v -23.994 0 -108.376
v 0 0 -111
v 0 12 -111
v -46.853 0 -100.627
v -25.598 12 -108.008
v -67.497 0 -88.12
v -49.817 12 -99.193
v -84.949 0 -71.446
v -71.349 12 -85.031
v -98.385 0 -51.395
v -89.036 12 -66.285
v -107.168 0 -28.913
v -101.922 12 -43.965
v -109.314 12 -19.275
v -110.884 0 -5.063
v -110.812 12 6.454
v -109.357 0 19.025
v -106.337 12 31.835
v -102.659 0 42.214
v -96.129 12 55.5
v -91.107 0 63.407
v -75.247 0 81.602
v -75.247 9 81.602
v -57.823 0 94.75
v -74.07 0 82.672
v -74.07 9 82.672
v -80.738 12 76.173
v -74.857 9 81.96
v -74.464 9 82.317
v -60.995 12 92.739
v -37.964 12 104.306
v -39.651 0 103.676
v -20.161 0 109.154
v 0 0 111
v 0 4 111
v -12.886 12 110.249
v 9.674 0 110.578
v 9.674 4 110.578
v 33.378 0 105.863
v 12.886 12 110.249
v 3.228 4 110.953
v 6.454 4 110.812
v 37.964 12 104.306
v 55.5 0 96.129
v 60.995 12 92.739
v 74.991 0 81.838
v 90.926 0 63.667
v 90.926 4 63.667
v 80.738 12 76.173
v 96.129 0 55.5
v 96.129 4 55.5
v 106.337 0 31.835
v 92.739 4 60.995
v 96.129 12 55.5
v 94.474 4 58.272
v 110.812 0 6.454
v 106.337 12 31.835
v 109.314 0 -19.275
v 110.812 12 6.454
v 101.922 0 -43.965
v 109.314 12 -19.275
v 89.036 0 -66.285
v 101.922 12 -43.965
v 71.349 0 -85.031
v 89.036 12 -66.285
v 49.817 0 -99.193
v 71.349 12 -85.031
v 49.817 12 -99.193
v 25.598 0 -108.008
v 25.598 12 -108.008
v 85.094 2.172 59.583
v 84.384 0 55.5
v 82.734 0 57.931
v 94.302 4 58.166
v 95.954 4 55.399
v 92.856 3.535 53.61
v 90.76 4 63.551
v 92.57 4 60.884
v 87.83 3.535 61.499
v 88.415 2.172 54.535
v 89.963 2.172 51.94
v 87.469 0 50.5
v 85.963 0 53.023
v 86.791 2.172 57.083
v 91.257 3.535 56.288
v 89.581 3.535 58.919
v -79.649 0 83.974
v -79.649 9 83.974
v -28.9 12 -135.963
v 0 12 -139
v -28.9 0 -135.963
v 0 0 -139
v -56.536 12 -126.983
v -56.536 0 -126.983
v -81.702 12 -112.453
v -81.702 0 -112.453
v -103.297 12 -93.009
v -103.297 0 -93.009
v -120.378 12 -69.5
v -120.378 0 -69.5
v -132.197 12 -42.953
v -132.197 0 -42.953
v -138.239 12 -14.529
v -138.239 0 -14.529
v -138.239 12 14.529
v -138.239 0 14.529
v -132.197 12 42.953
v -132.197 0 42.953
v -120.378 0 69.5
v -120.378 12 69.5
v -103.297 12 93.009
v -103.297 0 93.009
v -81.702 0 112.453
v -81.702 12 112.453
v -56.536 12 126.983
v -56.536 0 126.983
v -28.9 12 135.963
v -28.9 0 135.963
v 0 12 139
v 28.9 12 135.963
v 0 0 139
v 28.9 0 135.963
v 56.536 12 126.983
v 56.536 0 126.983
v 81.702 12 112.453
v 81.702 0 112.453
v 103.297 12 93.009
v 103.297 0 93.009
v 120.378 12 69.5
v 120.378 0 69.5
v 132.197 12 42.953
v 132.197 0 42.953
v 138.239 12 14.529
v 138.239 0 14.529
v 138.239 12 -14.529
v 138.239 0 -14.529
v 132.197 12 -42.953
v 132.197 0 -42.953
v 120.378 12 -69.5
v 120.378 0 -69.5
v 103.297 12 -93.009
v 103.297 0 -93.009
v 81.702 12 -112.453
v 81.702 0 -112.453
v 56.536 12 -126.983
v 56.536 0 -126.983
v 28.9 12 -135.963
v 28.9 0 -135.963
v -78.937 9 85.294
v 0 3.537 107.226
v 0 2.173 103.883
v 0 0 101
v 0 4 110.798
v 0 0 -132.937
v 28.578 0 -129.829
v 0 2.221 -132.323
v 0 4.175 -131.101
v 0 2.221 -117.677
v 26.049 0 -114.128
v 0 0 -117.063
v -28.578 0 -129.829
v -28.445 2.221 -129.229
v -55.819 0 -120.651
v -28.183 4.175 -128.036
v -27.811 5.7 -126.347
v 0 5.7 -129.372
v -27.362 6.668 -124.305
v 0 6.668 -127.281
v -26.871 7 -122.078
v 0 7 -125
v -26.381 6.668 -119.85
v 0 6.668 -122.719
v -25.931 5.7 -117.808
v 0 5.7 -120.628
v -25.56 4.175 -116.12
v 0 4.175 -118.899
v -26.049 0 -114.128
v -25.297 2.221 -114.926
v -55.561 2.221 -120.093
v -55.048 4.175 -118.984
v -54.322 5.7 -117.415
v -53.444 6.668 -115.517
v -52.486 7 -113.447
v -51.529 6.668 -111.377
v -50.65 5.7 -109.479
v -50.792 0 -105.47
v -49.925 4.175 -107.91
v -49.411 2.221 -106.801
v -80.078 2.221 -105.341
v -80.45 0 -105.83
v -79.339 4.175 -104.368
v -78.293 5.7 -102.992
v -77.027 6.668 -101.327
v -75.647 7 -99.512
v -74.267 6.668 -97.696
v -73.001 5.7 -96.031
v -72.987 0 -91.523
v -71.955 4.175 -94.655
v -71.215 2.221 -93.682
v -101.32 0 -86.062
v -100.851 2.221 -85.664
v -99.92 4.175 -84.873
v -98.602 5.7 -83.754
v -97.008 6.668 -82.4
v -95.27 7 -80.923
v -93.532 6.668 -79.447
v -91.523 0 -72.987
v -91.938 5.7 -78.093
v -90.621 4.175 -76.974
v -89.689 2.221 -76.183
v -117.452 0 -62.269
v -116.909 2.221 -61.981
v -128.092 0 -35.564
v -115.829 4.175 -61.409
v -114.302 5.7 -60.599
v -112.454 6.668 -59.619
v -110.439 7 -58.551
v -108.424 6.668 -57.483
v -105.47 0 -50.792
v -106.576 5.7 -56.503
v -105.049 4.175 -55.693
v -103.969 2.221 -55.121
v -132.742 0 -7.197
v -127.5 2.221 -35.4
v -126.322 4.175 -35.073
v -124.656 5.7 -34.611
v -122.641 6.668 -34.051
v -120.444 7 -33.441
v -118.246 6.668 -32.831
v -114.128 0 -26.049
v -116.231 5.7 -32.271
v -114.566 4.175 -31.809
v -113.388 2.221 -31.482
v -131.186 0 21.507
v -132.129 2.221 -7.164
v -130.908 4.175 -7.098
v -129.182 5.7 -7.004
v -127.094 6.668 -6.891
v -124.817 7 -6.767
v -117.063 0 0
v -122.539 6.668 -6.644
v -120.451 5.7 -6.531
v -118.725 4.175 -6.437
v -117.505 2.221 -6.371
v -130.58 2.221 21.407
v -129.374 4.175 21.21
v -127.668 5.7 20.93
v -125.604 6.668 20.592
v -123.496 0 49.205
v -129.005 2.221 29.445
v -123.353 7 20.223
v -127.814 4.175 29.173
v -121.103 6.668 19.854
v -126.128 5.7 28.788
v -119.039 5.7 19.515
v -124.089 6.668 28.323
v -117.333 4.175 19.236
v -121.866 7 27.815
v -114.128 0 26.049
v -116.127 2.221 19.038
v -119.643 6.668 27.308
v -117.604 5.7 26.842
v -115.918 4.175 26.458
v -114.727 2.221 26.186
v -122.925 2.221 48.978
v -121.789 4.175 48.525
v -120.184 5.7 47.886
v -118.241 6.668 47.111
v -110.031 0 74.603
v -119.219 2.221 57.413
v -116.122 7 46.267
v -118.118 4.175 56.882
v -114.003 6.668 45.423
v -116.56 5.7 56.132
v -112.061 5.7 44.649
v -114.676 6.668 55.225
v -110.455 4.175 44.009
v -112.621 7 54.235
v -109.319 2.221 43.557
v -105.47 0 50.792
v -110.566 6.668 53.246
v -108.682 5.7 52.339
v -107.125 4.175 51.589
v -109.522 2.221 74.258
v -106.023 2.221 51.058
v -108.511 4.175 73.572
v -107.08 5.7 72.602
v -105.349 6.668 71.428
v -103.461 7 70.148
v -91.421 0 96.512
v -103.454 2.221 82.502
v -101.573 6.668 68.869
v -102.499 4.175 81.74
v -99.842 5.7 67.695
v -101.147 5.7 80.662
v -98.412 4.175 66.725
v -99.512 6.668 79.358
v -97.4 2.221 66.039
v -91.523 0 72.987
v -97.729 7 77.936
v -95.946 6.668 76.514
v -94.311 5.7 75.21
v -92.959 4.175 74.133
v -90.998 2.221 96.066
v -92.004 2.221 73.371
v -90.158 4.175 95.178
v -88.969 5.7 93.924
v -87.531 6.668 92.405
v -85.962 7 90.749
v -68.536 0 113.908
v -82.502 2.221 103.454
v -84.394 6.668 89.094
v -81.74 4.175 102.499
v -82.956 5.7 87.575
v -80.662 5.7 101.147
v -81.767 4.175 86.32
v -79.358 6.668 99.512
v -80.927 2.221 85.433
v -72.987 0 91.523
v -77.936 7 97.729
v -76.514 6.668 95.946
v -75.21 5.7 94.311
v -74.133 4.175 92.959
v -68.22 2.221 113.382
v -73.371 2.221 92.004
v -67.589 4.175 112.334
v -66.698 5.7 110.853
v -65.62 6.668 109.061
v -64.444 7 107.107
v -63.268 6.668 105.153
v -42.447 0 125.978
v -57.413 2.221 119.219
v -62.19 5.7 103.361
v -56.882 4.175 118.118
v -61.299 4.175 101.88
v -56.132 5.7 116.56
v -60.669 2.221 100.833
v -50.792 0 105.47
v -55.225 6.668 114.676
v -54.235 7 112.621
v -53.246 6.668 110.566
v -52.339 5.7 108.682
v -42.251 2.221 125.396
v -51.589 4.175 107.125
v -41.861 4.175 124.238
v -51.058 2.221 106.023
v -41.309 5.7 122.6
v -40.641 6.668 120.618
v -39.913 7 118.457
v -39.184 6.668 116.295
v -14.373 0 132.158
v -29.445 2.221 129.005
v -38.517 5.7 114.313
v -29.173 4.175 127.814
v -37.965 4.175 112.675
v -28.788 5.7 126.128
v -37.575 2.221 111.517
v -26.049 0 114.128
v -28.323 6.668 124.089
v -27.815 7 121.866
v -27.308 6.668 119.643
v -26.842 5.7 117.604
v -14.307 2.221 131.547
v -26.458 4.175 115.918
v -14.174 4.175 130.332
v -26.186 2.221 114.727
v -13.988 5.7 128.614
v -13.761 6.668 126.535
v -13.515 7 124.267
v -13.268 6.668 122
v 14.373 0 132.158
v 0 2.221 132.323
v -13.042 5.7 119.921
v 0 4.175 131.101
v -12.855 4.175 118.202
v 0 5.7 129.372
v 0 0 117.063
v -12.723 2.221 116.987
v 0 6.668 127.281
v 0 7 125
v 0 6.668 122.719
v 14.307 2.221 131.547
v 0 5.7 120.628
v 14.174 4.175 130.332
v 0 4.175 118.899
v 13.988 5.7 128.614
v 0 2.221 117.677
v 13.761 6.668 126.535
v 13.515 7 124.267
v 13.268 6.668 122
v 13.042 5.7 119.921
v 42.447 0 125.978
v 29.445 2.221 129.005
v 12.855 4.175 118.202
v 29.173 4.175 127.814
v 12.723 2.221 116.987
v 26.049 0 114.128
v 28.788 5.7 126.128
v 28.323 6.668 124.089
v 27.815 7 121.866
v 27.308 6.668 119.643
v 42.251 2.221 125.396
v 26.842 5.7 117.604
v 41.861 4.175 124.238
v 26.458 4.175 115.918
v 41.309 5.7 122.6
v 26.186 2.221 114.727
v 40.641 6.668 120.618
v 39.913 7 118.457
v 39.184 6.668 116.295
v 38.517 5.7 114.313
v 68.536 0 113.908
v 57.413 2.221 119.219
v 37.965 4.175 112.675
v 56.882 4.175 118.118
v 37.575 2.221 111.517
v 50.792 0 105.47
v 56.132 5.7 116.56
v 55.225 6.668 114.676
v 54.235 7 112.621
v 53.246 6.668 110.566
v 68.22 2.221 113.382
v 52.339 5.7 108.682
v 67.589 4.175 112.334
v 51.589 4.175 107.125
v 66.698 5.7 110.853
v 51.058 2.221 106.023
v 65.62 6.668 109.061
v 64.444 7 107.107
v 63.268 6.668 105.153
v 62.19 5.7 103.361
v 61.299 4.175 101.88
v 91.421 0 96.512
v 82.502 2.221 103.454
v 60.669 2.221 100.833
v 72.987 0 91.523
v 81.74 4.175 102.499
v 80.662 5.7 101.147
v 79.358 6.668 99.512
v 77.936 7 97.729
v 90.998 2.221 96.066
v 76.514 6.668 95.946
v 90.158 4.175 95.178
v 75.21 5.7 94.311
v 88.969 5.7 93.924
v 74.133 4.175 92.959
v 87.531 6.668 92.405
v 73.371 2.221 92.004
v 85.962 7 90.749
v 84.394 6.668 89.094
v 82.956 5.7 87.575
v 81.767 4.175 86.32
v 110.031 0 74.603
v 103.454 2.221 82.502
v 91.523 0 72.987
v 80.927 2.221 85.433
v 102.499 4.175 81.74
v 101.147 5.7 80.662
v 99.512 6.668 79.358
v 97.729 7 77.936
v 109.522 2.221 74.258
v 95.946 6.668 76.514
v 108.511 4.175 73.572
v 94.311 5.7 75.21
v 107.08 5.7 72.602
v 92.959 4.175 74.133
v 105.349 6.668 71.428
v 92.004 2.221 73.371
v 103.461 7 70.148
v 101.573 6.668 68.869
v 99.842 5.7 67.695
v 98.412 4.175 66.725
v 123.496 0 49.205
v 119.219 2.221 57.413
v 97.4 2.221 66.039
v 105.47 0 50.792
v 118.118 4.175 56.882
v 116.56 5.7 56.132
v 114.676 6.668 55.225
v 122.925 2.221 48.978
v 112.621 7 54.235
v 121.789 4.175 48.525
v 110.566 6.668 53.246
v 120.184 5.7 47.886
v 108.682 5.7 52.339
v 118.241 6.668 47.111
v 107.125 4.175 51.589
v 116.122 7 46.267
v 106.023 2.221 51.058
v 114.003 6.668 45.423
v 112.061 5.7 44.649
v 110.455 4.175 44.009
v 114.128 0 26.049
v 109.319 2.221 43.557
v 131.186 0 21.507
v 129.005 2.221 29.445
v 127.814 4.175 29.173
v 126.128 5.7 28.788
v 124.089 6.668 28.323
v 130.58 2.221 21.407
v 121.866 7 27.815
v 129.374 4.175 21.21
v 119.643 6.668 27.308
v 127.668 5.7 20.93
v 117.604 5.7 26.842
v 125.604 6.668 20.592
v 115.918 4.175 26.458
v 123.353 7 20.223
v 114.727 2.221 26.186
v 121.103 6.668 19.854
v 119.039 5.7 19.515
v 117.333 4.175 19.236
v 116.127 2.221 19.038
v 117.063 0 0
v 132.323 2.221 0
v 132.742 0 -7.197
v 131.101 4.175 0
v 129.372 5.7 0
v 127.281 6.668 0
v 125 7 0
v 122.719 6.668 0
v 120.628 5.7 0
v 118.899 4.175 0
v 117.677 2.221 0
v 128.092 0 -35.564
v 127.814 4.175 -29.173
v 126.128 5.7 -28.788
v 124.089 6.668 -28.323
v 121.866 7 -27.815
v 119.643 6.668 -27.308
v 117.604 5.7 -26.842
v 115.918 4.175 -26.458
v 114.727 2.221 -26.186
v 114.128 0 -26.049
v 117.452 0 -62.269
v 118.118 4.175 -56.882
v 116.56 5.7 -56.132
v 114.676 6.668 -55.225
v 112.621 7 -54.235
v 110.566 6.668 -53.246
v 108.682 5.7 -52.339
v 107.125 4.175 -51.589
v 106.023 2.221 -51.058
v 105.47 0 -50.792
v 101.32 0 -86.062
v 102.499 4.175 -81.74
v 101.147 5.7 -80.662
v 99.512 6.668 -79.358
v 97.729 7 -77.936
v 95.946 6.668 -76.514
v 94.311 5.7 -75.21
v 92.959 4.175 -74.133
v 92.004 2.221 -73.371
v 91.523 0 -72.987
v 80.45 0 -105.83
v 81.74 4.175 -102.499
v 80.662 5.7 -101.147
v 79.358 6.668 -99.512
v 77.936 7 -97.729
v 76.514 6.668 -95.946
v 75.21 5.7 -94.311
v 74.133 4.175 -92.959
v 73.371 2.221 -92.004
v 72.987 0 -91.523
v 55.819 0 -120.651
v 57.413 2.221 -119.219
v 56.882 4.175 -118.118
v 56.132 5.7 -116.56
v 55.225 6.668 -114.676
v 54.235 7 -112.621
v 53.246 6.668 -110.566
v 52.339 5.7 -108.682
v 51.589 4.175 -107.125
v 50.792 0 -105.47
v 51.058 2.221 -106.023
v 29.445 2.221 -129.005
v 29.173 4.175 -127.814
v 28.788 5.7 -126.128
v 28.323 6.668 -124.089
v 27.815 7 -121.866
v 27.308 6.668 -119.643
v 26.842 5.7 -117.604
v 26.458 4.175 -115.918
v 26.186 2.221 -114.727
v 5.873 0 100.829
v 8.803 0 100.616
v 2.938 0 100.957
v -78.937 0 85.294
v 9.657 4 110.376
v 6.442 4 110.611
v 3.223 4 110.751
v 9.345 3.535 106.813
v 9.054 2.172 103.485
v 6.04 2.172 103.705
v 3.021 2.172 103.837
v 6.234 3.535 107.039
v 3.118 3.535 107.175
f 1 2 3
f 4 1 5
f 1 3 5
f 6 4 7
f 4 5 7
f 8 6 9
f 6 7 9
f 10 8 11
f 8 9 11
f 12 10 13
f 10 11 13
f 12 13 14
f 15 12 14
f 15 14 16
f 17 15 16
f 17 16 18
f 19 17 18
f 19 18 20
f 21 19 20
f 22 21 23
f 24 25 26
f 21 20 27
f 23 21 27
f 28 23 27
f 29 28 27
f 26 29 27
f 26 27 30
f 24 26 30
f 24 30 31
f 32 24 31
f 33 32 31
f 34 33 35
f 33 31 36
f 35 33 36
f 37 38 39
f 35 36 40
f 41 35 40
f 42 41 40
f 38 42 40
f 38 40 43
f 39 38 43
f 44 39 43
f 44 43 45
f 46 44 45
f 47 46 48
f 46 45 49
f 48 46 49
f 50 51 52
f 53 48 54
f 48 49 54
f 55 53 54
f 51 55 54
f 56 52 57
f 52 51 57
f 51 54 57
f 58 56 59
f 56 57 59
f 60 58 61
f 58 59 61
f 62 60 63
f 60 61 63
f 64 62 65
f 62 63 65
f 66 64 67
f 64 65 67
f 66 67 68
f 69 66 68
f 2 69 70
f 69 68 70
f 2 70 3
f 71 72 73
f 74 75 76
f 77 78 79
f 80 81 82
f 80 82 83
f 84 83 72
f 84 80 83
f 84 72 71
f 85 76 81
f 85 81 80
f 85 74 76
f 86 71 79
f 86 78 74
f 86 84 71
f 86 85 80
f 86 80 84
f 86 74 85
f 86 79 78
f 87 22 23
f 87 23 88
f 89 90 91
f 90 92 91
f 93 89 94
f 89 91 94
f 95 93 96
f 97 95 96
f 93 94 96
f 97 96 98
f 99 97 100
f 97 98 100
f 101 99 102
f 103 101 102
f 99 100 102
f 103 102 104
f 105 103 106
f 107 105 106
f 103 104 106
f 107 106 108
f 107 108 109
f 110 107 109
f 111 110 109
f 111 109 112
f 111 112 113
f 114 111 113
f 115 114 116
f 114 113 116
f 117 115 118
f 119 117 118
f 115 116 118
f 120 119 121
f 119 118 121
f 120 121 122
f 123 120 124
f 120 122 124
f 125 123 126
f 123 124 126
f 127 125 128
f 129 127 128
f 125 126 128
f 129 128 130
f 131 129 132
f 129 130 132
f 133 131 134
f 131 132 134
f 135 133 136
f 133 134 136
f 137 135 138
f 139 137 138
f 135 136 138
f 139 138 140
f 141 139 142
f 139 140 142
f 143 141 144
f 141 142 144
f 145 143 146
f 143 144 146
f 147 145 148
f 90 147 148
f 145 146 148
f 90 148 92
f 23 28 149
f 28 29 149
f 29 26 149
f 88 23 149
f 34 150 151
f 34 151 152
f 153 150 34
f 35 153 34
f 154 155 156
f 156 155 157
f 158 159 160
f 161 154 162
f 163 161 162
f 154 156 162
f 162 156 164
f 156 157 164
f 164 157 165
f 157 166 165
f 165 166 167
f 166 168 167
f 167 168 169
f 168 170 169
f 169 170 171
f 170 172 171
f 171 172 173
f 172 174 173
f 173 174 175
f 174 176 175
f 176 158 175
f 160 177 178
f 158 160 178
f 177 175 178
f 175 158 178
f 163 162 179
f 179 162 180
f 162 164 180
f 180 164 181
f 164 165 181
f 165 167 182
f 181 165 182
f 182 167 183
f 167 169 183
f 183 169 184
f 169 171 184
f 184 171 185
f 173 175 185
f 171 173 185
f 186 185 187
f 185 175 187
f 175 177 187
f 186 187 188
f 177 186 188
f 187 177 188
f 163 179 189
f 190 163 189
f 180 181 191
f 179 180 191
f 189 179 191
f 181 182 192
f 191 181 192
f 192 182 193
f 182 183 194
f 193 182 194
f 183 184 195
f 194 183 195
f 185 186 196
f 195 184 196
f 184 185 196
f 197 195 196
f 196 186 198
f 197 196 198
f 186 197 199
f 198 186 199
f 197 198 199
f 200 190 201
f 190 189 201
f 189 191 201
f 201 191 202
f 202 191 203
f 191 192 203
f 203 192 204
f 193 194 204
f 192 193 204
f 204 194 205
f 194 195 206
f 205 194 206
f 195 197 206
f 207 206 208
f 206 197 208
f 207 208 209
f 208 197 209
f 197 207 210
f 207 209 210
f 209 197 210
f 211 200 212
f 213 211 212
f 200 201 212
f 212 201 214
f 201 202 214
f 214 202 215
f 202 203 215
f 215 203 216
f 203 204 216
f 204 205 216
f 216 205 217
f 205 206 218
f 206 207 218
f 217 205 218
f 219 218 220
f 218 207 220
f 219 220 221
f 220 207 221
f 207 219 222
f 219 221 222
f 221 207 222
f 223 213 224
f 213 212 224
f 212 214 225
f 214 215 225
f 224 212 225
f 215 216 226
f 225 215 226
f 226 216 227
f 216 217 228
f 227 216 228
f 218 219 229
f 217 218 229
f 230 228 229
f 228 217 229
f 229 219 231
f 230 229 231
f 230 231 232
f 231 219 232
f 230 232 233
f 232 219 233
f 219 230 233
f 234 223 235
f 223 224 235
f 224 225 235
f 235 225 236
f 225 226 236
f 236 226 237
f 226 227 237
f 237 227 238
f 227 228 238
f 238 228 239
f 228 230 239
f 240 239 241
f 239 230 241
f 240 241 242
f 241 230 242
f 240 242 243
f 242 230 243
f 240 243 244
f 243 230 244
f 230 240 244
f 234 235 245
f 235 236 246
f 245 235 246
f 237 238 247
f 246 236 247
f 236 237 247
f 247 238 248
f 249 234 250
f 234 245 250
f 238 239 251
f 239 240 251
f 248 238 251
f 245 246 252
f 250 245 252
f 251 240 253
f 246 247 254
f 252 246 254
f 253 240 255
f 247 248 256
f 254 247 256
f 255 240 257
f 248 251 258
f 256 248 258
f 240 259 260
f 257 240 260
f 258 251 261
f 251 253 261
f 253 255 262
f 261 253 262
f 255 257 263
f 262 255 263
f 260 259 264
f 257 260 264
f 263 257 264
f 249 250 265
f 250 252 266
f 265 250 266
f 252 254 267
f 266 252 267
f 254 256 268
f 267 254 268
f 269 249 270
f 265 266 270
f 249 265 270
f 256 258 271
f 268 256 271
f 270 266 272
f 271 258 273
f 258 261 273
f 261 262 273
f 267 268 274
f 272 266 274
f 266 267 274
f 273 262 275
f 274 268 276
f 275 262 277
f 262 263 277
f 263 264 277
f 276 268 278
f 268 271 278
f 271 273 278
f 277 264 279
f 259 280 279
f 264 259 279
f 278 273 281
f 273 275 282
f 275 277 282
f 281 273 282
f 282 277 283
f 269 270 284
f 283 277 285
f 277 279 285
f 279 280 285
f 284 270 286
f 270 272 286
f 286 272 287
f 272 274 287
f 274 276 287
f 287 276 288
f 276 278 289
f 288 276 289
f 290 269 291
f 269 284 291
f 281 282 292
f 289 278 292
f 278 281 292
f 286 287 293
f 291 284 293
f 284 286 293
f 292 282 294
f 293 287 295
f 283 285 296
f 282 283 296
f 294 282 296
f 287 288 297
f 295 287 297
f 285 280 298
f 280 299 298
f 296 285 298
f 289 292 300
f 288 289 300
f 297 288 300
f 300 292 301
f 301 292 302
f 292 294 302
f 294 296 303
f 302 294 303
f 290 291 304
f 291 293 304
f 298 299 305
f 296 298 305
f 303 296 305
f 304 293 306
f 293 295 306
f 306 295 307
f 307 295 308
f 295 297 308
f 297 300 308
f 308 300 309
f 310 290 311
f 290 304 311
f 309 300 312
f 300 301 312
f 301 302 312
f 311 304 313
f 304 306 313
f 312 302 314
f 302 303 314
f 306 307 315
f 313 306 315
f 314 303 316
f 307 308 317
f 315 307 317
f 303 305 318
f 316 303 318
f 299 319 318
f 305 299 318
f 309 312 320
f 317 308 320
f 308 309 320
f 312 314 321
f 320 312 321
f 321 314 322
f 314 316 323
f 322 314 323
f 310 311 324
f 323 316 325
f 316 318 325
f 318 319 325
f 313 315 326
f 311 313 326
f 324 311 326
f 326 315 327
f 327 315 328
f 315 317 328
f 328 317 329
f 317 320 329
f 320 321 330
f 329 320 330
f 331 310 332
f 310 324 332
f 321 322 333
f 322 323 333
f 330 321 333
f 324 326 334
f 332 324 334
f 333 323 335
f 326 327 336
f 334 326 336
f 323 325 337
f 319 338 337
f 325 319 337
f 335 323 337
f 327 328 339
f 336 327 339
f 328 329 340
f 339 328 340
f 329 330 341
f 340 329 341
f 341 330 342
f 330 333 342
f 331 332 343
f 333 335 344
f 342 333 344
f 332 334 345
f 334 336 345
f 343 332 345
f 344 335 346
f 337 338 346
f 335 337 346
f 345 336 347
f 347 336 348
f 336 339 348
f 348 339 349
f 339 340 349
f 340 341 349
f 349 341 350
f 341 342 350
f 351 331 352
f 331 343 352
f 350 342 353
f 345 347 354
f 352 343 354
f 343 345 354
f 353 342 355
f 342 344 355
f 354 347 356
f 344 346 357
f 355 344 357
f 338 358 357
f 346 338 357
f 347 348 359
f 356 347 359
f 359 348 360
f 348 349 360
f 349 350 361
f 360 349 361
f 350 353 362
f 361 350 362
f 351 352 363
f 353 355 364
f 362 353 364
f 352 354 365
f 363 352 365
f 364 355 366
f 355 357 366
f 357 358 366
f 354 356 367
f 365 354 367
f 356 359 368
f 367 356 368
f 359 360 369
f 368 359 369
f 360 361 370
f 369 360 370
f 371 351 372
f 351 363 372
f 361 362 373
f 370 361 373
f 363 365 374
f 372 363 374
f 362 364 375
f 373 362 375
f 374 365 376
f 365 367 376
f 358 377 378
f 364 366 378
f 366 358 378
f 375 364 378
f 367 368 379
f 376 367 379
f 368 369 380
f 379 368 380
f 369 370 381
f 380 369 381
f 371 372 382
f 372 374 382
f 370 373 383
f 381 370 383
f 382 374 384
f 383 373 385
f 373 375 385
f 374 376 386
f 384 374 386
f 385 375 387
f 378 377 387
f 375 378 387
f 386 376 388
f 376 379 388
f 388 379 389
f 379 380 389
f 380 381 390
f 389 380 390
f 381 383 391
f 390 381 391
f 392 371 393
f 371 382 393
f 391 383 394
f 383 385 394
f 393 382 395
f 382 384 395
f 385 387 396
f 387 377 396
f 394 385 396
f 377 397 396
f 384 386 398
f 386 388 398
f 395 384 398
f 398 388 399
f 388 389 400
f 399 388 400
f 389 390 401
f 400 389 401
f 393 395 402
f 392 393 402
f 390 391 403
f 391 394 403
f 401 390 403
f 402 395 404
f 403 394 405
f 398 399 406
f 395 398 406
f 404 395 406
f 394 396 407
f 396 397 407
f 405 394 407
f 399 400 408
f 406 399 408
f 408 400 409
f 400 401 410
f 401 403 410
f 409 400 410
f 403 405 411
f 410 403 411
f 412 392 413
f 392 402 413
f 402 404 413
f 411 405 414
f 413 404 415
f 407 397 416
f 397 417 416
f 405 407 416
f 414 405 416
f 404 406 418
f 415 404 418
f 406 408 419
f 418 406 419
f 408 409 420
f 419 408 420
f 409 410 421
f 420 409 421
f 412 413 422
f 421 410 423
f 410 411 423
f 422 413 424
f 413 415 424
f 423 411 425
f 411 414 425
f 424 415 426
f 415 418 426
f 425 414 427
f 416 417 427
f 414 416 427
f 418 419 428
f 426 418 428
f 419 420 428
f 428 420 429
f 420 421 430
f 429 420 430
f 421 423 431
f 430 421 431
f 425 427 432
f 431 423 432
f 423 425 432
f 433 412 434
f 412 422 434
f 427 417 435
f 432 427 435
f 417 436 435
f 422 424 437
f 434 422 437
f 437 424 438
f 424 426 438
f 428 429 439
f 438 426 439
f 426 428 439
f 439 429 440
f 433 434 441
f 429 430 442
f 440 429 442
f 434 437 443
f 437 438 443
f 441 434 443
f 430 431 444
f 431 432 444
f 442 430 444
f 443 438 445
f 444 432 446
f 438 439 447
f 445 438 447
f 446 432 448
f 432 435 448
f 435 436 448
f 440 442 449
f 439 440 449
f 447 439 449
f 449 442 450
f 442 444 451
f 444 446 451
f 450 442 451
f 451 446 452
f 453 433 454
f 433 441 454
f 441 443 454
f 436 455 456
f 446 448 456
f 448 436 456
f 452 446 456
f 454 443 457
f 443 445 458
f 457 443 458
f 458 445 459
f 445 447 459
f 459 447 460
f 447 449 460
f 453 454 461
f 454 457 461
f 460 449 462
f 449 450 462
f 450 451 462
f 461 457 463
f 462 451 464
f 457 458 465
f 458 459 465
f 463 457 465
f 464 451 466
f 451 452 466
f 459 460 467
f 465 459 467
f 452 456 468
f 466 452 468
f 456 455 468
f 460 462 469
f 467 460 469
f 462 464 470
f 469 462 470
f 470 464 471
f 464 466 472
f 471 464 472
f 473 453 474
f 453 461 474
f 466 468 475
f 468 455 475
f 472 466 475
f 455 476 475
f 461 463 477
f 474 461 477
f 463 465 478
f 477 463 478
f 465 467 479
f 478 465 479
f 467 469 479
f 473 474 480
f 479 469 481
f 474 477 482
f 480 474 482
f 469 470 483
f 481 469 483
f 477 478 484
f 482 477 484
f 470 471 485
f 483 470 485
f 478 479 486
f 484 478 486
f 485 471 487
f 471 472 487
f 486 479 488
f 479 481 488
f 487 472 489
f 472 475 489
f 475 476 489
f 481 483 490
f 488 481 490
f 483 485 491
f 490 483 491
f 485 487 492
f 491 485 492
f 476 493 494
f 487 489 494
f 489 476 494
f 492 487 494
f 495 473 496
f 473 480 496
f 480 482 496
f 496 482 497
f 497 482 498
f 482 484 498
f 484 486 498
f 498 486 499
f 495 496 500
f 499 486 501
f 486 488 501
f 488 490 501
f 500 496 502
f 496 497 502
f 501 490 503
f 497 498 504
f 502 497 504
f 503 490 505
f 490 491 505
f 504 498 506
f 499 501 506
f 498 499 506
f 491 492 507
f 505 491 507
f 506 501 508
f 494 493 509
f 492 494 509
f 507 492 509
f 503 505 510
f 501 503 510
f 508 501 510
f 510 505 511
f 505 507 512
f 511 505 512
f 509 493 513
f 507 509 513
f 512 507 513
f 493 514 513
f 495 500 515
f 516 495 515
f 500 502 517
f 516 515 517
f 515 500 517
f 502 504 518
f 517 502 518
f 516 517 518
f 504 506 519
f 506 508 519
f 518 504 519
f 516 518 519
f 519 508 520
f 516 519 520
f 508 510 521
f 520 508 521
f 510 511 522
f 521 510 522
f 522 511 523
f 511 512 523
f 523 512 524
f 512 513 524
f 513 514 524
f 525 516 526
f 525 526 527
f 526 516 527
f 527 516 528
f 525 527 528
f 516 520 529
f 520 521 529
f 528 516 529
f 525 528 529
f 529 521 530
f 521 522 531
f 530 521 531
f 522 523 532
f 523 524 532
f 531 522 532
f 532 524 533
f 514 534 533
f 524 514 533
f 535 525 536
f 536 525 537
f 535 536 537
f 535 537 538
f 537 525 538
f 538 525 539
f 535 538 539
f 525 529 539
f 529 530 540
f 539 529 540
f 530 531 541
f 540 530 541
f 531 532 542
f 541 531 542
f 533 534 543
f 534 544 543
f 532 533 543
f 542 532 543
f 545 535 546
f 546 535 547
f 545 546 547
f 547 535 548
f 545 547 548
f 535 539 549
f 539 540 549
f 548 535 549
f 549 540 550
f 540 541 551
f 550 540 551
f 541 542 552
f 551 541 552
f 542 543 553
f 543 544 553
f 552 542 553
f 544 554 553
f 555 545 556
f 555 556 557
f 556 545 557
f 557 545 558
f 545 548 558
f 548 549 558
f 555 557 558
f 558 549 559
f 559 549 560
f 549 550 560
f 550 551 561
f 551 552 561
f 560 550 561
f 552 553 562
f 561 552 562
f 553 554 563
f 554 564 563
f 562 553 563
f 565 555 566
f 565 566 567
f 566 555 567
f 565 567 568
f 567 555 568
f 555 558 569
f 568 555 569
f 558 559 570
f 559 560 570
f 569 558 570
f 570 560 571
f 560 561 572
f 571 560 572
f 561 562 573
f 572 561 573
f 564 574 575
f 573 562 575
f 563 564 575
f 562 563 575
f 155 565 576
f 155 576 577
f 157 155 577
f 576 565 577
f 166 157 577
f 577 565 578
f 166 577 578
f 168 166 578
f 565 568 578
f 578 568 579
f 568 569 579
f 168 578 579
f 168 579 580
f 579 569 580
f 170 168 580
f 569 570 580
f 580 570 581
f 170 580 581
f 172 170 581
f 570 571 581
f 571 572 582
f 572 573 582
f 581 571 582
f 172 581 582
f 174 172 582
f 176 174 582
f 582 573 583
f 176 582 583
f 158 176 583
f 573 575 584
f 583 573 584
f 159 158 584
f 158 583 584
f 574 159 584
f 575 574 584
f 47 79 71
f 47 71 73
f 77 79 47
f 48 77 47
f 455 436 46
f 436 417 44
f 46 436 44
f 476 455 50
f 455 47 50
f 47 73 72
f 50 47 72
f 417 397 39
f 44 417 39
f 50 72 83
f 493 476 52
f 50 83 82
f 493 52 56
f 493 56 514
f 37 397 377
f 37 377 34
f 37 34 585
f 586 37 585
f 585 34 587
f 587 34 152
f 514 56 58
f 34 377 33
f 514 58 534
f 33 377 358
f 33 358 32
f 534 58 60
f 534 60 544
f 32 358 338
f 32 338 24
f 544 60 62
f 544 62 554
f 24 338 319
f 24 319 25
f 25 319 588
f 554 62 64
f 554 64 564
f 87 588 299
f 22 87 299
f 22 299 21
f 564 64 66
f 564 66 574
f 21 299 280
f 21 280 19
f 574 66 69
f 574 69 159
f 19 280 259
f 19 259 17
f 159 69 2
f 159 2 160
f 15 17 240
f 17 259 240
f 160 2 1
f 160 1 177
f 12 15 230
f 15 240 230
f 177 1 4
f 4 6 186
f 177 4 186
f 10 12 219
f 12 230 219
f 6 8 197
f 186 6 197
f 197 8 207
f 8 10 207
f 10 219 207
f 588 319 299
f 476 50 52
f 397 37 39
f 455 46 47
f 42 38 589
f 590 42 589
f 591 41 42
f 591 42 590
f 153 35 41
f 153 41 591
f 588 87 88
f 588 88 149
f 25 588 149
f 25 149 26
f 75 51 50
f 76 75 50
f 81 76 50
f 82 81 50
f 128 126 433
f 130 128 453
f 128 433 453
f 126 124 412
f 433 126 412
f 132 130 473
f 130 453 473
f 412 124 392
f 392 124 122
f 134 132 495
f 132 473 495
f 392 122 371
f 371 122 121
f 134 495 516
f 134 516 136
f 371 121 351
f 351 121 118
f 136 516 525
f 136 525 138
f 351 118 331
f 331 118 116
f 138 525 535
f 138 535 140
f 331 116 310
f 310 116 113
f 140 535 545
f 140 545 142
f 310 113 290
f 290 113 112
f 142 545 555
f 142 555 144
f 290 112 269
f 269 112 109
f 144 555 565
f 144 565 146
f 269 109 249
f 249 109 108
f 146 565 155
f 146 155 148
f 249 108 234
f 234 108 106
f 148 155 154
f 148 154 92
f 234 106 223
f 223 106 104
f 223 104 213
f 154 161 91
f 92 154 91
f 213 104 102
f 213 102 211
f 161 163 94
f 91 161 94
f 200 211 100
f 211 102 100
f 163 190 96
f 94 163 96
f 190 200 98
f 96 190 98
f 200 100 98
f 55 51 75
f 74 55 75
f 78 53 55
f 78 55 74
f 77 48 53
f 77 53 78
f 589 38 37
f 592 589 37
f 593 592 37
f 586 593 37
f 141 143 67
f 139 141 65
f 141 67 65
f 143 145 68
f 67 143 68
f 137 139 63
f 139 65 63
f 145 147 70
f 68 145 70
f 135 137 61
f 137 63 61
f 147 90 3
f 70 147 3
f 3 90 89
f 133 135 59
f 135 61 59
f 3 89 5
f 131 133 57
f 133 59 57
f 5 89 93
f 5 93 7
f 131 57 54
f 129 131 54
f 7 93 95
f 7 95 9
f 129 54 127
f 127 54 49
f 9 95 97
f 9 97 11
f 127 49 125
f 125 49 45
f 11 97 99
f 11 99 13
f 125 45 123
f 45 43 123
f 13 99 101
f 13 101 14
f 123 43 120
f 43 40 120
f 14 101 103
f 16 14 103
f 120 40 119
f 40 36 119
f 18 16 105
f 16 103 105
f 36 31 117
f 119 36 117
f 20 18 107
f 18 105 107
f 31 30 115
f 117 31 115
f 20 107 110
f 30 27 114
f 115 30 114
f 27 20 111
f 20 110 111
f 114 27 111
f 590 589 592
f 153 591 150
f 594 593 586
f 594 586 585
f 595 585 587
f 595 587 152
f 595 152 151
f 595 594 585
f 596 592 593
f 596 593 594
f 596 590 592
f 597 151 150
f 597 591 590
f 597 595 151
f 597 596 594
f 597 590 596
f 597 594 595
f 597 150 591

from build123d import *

# Parameters (mm, degrees)
BOSS_EXTRUDE1_START = -4
BOSS_EXTRUDE1_DEPTH = 4
CIRPATTERN2_COUNT   = 2
CIRPATTERN2_ANGLE   = 55
CUT_EXTRUDE1_DEPTH  = 9
FILLET1_R           = 14


with BuildPart() as part:
    # Sketch1 → Revolve1 (revolve)
    with BuildSketch(Plane.XY, mode=Mode.PRIVATE) as revolve1_sk:
        with BuildLine():
            Line((111, 12), (139, 12))
            Line((139, 12), (139, 0))
            Line((139, 0), (132.937253933, 0))
            ThreePointArc((132.937253933, 0), (125, 7), (117.062746067, 0))
            Line((117.062746067, 0), (111, 0))
            Line((111, 0), (111, 12))
        make_face()
    revolve(revolve1_sk.sketch.rotate(Axis((0, 4.511025306, 0), (0, 1, 0)), 90), axis=Axis((0, 4.511025306, 0), (0, 1, 0)))

    # Sketch2 → Boss-Extrude1 (add)
    with BuildSketch(Plane.XZ.offset(BOSS_EXTRUDE1_START)):
        with BuildLine():
            Line((82.734356473, 57.931220071), (90.925876916, 63.666984435))
            ThreePointArc((90.925876916, 63.666984435), (93.616450485, 59.640256526), (96.12881982, 55.5))
            Line((96.12881982, 55.5), (87.468565782, 50.5))
            ThreePointArc((87.468565782, 50.5), (85.182536027, 54.267260443), (82.734356473, 57.931220071))
        make_face()
    boss_extrude1 = extrude(amount=BOSS_EXTRUDE1_DEPTH)

    # CirPattern2: Boss-Extrude1 ×2 about axis
    cirpattern2_axis = Axis((0, 0, 0), (0, -1, 0))
    for i in range(1, CIRPATTERN2_COUNT):
        add(boss_extrude1.rotate(cirpattern2_axis, i * CIRPATTERN2_ANGLE / (CIRPATTERN2_COUNT - 1)))

    # Sketch5 → Cut-Extrude1 (cut)
    with BuildSketch(Plane.XZ):
        Polygon((-75.247171131, 81.601858047), (-79.64873019, 83.973835671), (-78.937136903, 85.294303389), (-74.070295271, 82.671587371), (-71.895448203, 81.499573429), (-72.60704149, 80.179105712), align=None)
    extrude(amount=-CUT_EXTRUDE1_DEPTH, mode=Mode.SUBTRACT)

    # Fillet1
    # the kernel refuses this fillet: 14 mm, written as the material it takes off along each edge
    with BuildSketch(Plane(origin=(0, 4, 0), x_dir=(0.9607578733888479, 0, 0.2773883716404464), z_dir=(0.2773883716404464, 0, -0.9607578733888479))) as fillet1_piece_1:
        with BuildLine():
            CenterArc((110.797958971, 14), FILLET1_R, 225.584691403, 44.415308597)
            Line((110.797958971, 0), (110.797958971, -0.28))
            Line((110.797958971, -0.28), (101, -0.28))
            Line((101, -0.28), (100.72, 0))
            ThreePointArc((100.72, 0), (100.72, 2), (100.804040821, 3.8))
            Line((100.804040821, 3.8), (101, 4))
        make_face()
    revolve(axis=Axis((0, 4, 0), (0, -1, 0)), revolution_arc=32.79120756, mode=Mode.SUBTRACT)
    with BuildSketch(Plane(origin=(0, 4, 0), x_dir=(0.32384482552331617, 0, 0.9461102097439669), z_dir=(0.9461102097439669, 0, -0.32384482552331617))) as fillet1_piece_2:
        with BuildLine():
            CenterArc((110.797958971, 14), FILLET1_R, 225.584691403, 44.415308597)
            Line((110.797958971, 0), (110.797958971, -0.28))
            Line((110.797958971, -0.28), (101, -0.28))
            Line((101, -0.28), (100.72, 0))
            ThreePointArc((100.72, 0), (100.72, 2), (100.804040821, 3.8))
            Line((100.804040821, 3.8), (101, 4))
        make_face()
    revolve(axis=Axis((0, 4, 0), (0, -1, 0)), revolution_arc=32.79120756, mode=Mode.SUBTRACT)


solid = part.part
